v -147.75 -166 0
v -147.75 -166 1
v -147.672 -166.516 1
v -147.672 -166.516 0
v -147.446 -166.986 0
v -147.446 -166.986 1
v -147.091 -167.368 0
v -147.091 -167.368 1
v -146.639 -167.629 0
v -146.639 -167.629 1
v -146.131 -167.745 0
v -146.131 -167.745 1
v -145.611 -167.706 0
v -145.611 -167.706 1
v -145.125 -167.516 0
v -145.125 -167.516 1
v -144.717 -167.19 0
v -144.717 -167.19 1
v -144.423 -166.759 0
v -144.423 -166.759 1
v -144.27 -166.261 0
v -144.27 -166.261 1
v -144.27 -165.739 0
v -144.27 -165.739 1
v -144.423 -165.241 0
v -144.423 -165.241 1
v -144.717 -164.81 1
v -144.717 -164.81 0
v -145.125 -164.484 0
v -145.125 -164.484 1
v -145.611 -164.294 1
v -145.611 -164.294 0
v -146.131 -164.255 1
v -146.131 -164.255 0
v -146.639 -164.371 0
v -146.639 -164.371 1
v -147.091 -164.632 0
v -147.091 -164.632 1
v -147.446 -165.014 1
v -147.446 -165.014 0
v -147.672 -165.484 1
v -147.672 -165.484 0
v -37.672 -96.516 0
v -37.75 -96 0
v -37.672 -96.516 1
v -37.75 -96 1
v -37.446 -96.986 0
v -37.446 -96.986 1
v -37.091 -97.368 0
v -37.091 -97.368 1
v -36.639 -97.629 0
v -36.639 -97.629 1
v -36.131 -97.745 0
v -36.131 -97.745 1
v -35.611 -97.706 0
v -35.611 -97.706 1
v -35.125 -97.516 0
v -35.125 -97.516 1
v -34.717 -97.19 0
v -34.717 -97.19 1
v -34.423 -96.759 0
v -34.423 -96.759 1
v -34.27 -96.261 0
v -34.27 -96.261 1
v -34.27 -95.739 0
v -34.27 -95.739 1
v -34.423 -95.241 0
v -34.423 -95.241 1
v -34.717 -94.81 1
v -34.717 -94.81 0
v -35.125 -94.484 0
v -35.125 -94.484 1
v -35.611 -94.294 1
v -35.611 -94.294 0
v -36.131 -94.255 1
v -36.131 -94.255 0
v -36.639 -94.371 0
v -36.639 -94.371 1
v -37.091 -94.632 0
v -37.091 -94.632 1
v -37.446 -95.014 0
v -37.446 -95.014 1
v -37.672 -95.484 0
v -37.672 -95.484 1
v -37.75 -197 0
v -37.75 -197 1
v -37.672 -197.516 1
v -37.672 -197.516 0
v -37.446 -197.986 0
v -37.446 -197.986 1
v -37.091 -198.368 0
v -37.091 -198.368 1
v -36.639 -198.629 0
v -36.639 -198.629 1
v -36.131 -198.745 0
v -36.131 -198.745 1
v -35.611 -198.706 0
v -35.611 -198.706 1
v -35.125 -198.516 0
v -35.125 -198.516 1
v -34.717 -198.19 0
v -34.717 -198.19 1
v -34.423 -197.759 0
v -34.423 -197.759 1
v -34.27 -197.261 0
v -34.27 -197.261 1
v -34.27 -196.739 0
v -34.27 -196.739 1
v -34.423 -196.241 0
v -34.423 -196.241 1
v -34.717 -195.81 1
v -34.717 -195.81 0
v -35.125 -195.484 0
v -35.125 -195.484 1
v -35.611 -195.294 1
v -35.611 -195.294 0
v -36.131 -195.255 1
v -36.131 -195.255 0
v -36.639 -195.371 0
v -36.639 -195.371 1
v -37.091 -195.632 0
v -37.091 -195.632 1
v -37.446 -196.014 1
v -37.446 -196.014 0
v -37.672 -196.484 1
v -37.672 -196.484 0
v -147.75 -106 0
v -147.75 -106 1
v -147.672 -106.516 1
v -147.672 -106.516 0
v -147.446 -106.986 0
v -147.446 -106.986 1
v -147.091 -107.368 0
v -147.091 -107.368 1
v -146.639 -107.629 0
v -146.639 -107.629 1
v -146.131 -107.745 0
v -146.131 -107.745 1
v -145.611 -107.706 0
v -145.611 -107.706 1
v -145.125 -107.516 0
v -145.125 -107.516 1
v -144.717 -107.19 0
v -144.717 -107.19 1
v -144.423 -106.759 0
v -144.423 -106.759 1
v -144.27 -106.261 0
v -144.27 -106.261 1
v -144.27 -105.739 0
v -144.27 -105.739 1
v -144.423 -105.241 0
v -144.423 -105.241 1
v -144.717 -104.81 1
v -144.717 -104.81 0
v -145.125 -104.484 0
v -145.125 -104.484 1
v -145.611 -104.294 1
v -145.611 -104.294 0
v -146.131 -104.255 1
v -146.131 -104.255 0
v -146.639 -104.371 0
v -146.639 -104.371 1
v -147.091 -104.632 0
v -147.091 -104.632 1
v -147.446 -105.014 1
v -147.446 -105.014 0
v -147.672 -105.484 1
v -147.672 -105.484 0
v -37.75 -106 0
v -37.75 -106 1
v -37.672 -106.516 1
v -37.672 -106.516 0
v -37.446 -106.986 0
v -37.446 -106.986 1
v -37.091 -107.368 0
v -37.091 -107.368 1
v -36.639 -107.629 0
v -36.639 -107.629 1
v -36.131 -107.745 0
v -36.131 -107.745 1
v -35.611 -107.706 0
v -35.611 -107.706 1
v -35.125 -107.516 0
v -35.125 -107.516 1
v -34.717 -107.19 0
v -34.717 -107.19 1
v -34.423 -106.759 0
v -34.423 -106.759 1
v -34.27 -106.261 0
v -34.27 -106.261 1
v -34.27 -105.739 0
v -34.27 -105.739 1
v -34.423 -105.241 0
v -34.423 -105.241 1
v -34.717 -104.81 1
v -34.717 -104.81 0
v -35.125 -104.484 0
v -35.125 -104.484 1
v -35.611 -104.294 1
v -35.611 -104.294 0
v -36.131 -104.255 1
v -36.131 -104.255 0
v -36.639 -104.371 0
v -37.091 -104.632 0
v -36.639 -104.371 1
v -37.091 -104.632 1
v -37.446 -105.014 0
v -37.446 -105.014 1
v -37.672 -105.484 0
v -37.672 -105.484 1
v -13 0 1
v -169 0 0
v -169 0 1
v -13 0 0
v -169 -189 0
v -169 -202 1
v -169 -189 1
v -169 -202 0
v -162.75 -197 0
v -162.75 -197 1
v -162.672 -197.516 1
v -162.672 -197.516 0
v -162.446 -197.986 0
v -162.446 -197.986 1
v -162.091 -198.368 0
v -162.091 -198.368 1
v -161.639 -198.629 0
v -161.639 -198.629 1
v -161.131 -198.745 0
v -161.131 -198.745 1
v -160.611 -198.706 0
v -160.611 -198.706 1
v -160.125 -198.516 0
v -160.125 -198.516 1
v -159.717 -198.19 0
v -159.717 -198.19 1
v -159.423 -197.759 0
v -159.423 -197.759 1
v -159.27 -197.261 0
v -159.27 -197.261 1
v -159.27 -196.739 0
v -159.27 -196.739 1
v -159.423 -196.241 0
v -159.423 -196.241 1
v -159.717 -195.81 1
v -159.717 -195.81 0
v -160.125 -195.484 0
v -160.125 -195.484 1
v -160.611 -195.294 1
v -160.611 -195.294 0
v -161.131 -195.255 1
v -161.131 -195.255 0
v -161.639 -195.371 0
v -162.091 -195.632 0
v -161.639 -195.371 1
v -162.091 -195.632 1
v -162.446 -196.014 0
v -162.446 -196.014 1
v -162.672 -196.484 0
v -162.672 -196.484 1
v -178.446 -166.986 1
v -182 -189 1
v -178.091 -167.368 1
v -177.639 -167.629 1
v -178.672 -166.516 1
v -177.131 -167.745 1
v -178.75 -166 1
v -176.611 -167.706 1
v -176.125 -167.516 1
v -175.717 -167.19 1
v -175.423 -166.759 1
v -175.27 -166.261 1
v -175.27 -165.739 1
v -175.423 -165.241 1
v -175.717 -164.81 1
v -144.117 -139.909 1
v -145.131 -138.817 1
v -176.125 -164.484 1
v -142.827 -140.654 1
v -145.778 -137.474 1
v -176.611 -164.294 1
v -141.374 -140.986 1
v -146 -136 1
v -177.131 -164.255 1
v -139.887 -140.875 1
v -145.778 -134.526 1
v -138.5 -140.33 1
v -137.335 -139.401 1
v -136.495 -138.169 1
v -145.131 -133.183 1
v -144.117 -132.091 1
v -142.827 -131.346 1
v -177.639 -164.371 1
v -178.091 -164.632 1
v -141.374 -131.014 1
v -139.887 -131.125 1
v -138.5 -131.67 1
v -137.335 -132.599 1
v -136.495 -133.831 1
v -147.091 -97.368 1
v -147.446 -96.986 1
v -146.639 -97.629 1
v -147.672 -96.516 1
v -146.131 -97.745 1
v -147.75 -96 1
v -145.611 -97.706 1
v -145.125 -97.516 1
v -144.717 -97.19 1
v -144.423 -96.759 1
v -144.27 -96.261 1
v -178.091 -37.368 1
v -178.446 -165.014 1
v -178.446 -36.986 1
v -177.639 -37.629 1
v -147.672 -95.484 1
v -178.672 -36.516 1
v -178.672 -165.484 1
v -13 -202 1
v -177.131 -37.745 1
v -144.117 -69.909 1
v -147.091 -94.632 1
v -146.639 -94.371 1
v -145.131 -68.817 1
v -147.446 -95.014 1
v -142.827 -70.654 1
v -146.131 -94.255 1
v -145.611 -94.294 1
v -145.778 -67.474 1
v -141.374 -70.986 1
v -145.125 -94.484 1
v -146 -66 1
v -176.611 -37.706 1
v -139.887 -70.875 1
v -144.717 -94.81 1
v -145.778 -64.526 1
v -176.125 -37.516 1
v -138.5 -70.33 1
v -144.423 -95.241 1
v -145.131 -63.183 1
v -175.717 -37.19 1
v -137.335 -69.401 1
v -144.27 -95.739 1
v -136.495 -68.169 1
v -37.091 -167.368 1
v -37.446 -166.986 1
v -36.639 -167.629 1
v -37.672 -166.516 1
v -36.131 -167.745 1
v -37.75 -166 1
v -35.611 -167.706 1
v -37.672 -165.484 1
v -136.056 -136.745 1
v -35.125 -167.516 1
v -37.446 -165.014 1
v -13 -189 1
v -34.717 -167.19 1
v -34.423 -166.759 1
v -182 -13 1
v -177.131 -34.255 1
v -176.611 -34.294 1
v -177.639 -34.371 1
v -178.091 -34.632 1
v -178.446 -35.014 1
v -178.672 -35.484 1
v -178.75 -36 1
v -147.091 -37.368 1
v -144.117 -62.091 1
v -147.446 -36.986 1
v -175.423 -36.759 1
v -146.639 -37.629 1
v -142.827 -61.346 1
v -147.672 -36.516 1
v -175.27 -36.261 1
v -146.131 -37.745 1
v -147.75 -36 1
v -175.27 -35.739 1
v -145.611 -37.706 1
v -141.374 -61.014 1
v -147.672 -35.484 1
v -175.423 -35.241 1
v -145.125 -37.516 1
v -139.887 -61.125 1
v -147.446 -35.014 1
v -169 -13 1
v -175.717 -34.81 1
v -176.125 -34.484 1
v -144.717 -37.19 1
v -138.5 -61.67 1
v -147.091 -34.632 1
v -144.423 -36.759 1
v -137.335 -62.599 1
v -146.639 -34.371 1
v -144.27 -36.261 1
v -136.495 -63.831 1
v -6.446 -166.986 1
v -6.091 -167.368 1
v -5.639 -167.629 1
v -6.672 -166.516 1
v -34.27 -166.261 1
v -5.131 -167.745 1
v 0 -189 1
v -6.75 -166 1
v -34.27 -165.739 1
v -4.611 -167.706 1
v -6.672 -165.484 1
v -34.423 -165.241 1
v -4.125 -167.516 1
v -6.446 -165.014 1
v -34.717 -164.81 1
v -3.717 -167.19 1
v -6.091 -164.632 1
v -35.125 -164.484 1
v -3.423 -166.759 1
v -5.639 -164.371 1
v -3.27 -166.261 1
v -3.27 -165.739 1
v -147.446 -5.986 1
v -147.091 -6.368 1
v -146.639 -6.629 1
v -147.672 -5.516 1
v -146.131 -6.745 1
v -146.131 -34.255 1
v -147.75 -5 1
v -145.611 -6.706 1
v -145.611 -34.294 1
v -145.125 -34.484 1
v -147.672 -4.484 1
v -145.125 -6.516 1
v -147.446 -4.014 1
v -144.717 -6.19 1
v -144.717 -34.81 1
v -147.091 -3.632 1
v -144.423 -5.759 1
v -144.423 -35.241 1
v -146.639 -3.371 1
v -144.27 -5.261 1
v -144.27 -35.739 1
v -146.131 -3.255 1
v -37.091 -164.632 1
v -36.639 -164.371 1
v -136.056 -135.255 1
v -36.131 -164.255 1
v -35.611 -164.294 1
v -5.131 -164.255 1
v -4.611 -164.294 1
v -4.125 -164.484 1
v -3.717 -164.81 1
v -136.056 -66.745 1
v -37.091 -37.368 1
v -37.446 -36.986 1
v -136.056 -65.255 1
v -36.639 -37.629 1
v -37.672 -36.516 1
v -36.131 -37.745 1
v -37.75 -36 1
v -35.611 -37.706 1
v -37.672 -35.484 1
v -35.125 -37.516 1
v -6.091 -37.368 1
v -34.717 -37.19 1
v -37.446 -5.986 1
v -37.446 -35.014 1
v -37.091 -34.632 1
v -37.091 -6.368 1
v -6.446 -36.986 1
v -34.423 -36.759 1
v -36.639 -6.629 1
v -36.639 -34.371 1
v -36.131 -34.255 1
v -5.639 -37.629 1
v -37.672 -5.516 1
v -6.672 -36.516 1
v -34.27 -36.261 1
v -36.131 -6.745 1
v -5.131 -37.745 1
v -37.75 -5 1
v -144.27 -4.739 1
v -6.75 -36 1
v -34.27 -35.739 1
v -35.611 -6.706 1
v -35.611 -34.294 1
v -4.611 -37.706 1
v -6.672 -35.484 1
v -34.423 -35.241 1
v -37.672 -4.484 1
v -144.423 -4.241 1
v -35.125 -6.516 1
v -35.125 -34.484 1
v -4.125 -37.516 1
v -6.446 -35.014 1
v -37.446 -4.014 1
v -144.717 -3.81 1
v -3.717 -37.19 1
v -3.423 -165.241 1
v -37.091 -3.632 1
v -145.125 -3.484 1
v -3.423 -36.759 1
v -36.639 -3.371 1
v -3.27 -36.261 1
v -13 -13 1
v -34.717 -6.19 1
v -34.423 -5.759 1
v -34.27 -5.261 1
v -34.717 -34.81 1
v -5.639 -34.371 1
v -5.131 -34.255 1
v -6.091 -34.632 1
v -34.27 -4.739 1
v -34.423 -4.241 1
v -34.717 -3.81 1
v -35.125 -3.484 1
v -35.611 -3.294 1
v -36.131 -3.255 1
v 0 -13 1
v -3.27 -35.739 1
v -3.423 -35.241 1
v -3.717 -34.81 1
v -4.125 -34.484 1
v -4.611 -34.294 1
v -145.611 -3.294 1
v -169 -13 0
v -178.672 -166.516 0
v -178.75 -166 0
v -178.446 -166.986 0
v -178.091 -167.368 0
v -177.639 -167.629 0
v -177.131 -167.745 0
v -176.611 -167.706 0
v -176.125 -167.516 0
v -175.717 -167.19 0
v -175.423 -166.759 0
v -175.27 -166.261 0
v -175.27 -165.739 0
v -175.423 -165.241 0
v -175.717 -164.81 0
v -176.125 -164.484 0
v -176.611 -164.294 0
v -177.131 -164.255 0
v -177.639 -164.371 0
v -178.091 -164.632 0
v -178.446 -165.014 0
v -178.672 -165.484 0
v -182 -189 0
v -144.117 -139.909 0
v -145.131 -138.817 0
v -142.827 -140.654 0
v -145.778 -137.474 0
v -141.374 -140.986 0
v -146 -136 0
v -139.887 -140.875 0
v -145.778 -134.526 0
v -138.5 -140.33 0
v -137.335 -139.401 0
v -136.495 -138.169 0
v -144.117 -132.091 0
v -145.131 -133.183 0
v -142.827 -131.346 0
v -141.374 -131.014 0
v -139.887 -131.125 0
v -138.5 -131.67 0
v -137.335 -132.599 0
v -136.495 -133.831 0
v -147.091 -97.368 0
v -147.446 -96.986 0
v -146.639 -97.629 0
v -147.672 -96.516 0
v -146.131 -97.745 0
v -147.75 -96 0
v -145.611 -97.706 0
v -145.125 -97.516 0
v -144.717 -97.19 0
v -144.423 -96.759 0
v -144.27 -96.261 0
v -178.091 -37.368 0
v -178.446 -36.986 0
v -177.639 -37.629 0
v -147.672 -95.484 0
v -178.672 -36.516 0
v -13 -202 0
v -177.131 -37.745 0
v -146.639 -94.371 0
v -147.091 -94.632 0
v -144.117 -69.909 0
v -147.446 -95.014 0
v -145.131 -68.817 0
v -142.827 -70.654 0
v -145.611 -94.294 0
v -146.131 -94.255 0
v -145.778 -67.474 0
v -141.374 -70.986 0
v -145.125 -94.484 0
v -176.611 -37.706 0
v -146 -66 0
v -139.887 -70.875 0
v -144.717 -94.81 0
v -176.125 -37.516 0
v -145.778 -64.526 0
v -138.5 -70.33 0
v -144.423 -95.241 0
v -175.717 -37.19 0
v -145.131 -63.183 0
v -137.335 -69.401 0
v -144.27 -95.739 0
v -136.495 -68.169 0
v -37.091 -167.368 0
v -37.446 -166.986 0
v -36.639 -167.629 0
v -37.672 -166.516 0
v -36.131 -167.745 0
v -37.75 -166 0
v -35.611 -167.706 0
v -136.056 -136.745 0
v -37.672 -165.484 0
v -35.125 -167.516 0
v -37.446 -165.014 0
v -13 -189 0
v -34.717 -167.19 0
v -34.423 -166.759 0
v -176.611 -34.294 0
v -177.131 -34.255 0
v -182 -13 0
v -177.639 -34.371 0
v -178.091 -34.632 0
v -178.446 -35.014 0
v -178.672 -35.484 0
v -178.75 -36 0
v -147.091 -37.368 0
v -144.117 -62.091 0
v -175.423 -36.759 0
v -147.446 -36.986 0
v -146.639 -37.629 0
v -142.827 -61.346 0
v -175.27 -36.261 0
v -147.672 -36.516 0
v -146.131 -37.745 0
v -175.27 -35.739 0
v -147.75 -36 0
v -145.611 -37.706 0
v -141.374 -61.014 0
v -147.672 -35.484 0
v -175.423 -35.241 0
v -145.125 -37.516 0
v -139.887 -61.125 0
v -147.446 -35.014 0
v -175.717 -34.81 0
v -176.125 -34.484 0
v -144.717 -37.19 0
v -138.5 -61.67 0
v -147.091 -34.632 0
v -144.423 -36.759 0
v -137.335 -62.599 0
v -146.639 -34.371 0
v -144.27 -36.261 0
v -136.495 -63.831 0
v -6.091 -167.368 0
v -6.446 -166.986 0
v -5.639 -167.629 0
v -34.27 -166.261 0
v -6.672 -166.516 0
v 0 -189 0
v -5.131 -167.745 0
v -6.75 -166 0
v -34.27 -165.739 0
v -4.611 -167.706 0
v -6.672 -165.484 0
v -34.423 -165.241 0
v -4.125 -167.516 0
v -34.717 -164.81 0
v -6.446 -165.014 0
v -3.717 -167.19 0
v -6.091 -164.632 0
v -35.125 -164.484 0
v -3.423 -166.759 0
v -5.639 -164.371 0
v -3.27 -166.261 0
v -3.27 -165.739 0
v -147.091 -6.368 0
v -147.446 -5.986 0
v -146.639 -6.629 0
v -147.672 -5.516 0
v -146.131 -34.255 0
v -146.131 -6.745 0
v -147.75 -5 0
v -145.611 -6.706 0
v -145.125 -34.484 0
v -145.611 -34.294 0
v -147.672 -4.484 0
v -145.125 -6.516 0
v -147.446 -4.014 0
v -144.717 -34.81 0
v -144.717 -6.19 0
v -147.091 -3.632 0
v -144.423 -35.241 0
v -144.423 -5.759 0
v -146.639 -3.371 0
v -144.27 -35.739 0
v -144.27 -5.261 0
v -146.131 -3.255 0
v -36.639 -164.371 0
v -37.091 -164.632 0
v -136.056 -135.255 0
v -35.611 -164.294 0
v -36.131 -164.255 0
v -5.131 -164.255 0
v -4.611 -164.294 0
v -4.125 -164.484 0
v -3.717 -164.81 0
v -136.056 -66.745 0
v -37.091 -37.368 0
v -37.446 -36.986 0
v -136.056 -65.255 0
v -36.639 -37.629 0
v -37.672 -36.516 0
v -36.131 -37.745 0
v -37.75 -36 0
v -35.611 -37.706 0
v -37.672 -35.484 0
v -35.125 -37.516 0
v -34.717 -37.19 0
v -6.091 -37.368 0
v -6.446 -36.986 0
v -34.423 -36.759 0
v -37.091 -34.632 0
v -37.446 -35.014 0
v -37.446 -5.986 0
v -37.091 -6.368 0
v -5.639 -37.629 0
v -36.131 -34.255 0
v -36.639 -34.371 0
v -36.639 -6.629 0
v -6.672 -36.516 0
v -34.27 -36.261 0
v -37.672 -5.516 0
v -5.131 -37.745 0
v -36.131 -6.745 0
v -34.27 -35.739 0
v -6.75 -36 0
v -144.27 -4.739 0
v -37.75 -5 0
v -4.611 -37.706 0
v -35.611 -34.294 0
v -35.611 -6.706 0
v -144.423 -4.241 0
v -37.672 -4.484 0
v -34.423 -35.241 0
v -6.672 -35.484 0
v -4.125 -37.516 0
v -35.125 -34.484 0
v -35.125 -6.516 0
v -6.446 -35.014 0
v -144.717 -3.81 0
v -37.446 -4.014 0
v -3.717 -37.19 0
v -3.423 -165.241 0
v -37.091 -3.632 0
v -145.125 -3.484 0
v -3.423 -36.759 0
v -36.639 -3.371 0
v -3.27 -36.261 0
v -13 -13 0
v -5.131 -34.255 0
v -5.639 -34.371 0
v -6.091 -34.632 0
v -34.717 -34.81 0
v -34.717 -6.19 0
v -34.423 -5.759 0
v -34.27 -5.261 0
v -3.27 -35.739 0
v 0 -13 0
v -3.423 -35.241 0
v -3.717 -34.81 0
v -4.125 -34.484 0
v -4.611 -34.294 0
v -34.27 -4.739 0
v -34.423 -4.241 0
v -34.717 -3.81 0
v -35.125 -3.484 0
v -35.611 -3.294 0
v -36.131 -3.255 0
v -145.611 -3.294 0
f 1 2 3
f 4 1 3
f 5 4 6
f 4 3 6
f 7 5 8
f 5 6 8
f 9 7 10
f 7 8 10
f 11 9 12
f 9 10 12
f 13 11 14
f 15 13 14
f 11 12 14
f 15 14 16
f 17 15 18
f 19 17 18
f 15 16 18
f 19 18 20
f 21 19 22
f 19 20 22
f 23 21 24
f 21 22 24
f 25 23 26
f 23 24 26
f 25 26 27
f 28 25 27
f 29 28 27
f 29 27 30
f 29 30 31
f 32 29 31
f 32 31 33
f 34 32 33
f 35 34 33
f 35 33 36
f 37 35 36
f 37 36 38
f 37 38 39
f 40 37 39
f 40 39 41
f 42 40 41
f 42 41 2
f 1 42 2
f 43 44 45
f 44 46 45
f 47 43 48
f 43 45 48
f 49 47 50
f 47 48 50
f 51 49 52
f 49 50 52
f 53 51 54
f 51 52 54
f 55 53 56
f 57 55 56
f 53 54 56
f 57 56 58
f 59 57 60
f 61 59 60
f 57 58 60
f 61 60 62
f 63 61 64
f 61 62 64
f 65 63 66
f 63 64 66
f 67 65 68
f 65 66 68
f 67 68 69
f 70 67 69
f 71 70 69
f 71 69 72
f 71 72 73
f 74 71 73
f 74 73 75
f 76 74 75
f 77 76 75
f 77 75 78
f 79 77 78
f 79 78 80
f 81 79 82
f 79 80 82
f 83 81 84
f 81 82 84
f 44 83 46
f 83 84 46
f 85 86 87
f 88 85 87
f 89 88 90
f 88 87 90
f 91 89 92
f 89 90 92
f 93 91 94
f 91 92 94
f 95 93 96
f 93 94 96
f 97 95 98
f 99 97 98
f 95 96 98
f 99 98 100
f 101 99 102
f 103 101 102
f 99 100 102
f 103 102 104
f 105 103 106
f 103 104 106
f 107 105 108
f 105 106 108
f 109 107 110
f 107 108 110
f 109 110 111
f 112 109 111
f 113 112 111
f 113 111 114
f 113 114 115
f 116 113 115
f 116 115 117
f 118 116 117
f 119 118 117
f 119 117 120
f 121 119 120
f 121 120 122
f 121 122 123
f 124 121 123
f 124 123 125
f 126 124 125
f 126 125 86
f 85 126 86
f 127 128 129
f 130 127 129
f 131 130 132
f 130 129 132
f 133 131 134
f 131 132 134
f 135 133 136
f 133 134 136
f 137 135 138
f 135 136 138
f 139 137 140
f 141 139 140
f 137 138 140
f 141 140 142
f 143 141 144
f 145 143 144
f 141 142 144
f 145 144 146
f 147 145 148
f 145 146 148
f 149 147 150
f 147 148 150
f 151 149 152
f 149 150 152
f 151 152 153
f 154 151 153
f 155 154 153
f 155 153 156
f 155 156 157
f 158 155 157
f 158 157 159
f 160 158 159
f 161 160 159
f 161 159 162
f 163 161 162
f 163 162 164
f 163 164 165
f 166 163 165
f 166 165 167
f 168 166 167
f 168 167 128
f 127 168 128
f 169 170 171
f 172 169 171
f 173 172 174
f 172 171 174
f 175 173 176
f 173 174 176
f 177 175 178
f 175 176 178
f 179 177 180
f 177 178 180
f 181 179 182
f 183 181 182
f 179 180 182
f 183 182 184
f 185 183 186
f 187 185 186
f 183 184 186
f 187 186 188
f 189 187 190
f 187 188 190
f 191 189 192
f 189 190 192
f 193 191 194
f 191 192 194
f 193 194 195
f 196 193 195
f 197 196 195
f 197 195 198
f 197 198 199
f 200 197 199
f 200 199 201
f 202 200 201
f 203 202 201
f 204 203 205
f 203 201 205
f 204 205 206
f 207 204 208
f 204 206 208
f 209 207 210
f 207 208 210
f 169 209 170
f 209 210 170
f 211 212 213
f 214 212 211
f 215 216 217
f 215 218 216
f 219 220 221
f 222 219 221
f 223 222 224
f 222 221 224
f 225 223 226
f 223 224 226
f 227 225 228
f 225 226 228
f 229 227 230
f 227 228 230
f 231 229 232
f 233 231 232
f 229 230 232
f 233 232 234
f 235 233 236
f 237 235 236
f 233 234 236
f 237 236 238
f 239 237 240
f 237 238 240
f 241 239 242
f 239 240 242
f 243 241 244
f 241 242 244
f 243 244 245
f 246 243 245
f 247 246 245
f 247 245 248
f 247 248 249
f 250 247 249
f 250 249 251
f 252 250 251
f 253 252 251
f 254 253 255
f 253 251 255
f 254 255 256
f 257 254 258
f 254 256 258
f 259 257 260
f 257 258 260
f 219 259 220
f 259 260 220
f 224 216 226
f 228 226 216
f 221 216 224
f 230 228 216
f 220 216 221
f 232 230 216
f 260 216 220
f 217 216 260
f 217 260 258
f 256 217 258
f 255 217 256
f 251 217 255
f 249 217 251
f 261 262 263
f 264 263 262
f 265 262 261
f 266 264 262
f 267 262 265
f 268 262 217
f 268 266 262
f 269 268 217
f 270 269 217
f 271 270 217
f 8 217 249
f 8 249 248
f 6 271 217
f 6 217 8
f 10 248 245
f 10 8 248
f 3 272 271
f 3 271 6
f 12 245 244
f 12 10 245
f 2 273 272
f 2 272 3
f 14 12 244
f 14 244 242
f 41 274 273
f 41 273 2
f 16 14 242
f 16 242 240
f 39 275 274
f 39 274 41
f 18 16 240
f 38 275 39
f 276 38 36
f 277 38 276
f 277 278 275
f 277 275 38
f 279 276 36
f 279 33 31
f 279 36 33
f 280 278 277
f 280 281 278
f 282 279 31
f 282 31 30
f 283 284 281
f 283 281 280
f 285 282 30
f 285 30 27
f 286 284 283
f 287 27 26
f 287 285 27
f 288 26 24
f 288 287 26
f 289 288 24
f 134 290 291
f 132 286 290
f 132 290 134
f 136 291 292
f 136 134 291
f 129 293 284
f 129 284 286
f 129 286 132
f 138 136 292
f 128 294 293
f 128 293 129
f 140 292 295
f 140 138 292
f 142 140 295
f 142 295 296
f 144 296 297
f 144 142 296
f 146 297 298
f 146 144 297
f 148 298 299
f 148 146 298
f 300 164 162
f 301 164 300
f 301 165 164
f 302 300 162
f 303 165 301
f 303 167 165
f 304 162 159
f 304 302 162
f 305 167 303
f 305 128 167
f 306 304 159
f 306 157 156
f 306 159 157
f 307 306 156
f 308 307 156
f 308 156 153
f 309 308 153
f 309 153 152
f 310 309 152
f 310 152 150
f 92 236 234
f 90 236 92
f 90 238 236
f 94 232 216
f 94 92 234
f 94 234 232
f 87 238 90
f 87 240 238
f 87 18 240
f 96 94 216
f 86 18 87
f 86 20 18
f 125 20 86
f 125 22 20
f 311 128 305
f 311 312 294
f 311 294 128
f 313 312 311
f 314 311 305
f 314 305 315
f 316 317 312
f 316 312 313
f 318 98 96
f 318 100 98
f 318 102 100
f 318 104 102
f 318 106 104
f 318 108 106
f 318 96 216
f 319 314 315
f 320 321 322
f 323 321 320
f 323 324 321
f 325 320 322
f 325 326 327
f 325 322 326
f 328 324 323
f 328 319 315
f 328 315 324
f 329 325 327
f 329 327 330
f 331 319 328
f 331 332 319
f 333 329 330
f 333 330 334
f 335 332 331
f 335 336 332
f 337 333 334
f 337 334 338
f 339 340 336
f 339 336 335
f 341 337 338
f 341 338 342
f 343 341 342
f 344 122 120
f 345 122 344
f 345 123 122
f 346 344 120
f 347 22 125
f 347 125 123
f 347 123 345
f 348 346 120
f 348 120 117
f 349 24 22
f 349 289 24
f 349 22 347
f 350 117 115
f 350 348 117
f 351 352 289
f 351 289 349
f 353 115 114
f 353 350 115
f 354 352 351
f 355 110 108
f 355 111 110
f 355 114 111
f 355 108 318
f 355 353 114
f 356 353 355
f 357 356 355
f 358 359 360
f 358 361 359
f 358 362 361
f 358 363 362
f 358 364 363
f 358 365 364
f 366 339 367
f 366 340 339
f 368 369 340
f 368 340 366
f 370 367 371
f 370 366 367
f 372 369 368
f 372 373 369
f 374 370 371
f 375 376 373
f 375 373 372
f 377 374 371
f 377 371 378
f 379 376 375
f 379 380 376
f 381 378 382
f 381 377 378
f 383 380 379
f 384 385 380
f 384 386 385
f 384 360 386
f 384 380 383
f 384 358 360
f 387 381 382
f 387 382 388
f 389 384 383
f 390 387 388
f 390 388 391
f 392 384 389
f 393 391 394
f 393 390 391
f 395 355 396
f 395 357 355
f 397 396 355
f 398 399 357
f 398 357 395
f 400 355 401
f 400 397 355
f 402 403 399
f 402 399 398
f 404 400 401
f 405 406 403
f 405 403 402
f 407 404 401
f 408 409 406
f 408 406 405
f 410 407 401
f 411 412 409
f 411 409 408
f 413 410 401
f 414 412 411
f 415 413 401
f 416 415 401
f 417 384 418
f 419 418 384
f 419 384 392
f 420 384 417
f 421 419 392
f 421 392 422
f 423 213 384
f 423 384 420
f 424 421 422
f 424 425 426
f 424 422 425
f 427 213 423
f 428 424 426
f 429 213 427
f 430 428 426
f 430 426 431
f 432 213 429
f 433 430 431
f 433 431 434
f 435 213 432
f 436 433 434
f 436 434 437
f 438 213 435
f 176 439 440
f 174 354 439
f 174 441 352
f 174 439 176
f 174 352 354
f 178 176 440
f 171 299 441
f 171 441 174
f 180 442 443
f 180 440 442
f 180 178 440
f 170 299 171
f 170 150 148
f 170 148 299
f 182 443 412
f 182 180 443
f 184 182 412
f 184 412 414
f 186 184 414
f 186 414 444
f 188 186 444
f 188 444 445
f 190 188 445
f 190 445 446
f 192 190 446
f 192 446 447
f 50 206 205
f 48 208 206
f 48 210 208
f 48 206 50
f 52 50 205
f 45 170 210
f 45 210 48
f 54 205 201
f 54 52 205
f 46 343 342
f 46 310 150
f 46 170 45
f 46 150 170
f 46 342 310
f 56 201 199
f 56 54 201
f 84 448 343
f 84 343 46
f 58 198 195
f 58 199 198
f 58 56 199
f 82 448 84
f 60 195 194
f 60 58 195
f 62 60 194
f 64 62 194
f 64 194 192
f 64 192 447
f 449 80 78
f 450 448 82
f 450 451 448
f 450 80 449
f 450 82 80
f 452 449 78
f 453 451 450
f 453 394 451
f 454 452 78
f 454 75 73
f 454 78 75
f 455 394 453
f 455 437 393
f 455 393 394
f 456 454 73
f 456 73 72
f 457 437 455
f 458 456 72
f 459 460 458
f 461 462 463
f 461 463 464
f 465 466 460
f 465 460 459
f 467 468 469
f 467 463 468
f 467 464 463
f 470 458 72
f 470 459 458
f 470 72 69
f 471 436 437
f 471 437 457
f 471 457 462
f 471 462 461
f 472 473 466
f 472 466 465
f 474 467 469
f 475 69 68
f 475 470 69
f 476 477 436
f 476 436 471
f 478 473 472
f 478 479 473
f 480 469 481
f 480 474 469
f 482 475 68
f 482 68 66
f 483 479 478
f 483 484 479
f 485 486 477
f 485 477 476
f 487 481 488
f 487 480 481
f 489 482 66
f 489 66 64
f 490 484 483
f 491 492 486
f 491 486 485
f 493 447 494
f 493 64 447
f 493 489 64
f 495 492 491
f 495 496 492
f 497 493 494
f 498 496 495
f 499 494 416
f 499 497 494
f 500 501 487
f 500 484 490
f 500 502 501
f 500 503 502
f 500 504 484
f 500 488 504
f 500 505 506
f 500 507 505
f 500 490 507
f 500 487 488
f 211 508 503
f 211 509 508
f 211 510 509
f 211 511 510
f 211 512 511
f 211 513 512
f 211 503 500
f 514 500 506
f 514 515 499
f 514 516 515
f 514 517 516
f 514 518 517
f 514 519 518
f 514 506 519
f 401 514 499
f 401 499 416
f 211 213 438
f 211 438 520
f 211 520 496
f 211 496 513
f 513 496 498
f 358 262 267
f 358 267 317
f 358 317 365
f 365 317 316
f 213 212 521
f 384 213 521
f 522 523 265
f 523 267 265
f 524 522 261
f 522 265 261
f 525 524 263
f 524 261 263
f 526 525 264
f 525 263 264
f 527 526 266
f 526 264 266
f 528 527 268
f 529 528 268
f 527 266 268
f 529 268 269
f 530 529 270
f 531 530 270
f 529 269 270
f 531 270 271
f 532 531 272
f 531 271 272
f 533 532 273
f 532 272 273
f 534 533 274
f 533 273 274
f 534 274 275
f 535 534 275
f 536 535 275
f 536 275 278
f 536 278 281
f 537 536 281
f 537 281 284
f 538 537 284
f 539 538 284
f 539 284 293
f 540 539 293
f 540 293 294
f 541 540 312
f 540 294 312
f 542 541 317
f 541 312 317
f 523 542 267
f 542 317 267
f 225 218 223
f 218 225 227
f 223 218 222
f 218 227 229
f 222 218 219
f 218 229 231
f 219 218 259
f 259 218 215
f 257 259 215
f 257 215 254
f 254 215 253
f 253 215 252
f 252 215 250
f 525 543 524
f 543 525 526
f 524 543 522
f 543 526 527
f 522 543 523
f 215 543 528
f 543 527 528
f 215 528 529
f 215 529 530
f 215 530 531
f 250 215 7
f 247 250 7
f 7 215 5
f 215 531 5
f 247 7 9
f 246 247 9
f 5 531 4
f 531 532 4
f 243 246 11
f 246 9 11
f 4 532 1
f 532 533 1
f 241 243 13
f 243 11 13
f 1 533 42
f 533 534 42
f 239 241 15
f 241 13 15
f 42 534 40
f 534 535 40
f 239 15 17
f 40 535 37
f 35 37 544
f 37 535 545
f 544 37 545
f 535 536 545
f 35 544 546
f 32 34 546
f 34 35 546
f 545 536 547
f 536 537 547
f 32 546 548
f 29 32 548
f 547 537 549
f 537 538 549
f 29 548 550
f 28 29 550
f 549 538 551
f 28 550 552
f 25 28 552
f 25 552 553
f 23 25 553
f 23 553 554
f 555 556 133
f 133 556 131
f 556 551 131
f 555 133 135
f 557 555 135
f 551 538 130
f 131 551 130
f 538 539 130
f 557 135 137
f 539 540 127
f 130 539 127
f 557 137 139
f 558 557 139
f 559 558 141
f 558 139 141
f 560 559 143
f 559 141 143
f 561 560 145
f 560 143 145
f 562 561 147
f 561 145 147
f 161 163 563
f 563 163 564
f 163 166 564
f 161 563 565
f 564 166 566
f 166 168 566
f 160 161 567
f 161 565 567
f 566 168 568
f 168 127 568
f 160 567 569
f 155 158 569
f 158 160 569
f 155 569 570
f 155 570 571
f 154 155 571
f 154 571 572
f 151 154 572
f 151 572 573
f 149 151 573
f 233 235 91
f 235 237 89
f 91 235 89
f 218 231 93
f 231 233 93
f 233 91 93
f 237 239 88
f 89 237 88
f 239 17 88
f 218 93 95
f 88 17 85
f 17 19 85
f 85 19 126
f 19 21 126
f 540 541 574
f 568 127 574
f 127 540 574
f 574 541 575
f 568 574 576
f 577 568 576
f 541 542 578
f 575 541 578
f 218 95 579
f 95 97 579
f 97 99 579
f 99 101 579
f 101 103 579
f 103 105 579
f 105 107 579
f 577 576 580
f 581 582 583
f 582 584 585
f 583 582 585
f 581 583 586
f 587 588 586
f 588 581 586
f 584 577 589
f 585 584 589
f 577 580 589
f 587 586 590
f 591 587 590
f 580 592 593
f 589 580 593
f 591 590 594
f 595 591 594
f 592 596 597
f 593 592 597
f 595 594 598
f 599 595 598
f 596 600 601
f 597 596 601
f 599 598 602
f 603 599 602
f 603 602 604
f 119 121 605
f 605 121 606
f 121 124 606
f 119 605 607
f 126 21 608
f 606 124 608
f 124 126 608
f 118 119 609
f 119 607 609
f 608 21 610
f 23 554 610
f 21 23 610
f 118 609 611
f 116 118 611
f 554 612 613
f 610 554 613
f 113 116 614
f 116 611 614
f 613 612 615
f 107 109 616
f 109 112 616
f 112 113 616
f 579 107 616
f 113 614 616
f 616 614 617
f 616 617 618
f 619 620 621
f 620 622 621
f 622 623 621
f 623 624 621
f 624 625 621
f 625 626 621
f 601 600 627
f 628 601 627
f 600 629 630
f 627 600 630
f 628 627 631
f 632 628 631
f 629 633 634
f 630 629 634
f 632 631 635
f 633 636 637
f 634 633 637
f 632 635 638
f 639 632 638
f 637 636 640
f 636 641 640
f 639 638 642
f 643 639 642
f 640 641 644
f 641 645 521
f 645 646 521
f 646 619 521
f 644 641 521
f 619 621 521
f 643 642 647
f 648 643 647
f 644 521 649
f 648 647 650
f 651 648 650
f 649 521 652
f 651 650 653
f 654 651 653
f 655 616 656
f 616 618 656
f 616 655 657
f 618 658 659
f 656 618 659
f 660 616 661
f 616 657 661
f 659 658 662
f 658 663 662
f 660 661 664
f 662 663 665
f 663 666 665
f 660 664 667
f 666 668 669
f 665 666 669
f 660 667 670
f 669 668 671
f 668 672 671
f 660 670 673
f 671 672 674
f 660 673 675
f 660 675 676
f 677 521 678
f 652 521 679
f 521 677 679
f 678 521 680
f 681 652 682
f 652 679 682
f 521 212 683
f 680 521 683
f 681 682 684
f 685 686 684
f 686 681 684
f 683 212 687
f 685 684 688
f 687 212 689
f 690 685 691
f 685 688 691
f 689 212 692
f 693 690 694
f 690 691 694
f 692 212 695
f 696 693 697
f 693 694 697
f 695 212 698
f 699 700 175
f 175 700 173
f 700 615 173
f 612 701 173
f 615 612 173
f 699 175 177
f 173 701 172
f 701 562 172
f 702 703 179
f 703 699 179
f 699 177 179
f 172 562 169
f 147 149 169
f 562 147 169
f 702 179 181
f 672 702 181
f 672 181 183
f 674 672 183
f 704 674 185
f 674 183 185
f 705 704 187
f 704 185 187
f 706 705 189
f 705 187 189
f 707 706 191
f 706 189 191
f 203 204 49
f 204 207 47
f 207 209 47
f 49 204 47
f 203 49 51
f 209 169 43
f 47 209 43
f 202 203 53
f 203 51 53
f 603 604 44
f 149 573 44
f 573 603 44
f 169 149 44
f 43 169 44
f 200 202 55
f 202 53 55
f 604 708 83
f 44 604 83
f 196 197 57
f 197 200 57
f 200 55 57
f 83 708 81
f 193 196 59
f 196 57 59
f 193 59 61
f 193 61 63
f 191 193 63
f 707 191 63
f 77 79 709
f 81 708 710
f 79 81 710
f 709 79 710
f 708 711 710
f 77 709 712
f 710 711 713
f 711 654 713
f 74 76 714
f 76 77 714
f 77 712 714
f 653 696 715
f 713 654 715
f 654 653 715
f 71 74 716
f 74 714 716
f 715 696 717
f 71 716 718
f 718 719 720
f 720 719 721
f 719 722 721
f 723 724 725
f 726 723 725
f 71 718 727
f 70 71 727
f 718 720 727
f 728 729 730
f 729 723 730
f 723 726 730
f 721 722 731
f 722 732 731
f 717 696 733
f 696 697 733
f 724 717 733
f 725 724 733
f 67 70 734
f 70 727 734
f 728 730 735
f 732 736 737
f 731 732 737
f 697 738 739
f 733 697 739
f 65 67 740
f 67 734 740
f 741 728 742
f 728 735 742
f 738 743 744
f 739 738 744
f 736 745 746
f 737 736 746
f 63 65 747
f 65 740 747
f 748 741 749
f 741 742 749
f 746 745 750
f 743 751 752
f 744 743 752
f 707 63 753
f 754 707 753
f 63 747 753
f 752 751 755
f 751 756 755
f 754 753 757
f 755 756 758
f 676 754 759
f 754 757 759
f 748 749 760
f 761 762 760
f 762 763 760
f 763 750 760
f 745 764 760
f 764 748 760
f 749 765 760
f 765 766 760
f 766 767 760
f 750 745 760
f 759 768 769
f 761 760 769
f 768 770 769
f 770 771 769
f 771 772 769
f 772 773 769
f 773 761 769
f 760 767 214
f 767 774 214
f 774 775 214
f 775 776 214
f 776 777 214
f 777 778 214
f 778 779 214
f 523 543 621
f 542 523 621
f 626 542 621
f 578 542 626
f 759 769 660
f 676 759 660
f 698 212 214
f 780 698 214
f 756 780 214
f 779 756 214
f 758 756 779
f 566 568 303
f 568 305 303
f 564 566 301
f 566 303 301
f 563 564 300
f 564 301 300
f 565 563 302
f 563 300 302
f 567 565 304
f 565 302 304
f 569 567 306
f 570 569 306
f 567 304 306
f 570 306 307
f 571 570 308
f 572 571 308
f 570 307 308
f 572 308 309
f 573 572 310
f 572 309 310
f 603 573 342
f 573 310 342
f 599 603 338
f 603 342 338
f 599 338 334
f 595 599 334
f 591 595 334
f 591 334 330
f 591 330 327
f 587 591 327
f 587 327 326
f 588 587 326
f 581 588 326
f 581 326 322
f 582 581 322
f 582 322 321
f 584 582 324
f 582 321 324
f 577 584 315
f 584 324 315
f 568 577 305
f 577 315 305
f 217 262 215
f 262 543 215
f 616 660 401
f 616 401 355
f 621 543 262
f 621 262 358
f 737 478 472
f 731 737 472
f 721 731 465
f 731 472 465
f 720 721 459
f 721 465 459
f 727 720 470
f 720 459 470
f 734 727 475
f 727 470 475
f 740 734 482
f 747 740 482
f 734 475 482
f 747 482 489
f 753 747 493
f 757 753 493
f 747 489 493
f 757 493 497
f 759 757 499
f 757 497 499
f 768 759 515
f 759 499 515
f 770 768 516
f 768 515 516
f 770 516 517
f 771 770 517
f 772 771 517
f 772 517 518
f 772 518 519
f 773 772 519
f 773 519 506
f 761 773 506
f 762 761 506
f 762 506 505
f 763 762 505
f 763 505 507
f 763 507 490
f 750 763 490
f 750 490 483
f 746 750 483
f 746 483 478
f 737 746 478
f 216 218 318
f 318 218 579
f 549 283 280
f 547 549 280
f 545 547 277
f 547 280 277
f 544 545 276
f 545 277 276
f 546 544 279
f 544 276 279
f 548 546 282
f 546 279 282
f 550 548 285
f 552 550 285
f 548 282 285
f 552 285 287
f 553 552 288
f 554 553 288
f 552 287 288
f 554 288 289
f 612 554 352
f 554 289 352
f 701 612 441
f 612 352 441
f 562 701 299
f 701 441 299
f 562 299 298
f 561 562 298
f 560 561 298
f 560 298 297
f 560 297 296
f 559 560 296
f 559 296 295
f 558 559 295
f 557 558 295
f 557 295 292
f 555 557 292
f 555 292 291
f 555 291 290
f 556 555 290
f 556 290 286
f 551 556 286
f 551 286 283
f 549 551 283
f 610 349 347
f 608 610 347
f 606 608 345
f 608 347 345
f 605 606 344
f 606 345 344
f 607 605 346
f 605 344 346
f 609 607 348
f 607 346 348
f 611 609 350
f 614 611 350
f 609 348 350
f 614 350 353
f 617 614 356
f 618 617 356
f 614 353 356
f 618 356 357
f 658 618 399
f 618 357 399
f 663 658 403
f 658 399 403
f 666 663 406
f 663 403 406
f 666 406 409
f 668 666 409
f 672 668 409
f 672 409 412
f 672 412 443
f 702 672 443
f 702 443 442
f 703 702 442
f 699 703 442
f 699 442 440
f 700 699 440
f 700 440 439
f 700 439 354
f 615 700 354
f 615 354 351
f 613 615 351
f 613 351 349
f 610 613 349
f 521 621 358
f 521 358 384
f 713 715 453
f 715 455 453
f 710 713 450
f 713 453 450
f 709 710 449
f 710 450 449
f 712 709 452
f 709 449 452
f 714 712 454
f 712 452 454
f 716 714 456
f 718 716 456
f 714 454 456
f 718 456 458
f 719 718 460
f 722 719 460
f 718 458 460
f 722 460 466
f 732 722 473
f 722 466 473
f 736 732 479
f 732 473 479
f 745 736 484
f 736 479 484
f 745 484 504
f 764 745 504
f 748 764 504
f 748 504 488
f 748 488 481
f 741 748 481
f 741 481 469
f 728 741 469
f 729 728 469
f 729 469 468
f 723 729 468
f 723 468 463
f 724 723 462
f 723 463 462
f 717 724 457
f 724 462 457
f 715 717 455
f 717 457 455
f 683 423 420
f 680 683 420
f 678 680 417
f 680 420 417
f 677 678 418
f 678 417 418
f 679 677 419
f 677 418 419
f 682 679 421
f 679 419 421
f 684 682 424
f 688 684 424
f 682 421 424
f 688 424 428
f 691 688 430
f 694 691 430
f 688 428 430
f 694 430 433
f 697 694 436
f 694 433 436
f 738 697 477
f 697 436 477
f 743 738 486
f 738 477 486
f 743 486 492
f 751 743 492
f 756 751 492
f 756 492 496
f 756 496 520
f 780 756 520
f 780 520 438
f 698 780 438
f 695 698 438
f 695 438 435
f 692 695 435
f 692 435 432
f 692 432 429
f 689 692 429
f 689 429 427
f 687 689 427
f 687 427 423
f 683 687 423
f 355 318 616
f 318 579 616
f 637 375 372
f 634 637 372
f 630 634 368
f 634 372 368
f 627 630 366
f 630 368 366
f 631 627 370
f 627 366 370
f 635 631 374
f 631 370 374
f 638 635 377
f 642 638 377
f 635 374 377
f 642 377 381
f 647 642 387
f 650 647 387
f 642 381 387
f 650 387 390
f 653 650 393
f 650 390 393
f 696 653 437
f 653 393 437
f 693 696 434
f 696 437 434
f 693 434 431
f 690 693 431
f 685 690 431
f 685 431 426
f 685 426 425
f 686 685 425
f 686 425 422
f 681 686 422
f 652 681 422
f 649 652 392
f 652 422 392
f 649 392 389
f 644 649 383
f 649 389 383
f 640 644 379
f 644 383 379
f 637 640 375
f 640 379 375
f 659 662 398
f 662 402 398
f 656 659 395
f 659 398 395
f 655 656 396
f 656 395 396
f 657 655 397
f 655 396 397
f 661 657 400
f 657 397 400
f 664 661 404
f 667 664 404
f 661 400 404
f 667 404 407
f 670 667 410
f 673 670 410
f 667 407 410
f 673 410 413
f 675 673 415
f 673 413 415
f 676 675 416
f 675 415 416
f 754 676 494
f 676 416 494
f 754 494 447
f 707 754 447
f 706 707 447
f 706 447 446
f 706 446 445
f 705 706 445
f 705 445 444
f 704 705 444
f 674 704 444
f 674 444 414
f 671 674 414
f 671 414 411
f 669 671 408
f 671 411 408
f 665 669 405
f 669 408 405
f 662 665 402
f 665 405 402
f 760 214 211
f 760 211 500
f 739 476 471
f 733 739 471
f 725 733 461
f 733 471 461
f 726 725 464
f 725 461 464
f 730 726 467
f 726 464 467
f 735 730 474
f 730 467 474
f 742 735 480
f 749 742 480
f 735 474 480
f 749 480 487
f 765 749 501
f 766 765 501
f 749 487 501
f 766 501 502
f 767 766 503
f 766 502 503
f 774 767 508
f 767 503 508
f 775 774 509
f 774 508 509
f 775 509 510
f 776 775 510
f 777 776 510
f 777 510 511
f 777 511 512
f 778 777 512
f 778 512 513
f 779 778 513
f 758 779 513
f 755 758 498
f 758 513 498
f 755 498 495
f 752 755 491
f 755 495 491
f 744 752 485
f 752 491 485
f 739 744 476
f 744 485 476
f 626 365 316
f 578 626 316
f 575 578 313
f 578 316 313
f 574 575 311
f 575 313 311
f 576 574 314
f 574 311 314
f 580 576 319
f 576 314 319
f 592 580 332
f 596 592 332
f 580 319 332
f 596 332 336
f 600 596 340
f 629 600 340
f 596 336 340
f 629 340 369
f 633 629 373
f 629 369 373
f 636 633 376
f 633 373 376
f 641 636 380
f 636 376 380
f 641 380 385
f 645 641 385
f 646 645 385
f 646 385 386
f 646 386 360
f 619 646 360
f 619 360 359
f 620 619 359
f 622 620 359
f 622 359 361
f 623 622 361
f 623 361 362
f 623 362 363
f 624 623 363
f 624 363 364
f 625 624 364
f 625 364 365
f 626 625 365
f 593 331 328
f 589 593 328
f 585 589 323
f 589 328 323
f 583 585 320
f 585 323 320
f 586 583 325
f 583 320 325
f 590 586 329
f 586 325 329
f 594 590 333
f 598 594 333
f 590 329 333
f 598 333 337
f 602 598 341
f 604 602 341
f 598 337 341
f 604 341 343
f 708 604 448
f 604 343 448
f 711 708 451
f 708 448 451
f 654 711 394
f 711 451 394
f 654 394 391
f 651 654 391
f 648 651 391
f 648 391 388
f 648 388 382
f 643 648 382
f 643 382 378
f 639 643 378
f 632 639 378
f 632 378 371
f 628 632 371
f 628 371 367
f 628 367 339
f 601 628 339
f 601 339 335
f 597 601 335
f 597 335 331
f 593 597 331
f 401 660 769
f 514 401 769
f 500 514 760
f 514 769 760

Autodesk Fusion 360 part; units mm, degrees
sketch "Sketch1" plane through (0, 0, 0) normal (0, 0, 1) x (1, 0, 0) in component "Hot Plate Mounting Plate"
  line L0 (0, 0) -> (-182, 0) construction
  line L1 (-182, 0) -> (-182, -202) construction
  line L2 (-182, -202) -> (0, -202) construction
  line L3 (0, -202) -> (0, 0) construction
  line L4 (-91, -202) -> (-91, 0) construction
  line L5 (0, -101) -> (-182, -101) construction
  line L6 (-91, 0) -> (-13, 0)
  line L7 (-91, 0) -> (-169, 0)
  line L8 (-91, -202) -> (-13, -202)
  line L9 (-91, -202) -> (-169, -202)
  line L10 (0, -101) -> (0, -13)
  line L11 (0, -101) -> (0, -189)
  line L12 (-182, -101) -> (-182, -189)
  line L13 (-182, -101) -> (-182, -13)
  line L14 (-182, -13) -> (0, -13) construction
  line L15 (0, -189) -> (-182, -189) construction
  line L16 (-13, -202) -> (-13, 0) construction
  line L17 (-169, 0) -> (-169, -202) construction
  line L18 (0, -189) -> (-13, -189)
  line L19 (-13, -202) -> (-13, -189)
  line L20 (-169, -202) -> (-169, -189)
  line L21 (-182, -189) -> (-169, -189)
  line L22 (0, -13) -> (-13, -13)
  line L23 (-13, 0) -> (-13, -13)
  line L24 (-169, 0) -> (-169, -13)
  line L25 (-182, -13) -> (-169, -13)
  dimension "d1" = 182
  dimension "d2" = 202
  dimension "d3" = 78
  dimension "d4" = 78
  dimension "d5" = 78
  dimension "d6" = 78
  dimension "d7" = 88
  dimension "d8" = 88
  dimension "d9" = 88
  dimension "d10" = 88
extrude "Extrude1" add sketch "Sketch1" along normal blind 1 in component "Hot Plate Mounting Plate"
sketch "Sketch3" plane through (0, 0, 1) normal (0, 0, 1) x (-1, 0, 0) in component "Hot Plate Mounting Plate"
  line L0 (182, 13) -> (182, 189)
  line L1 (182, 189) -> (169, 189)
  line L2 (169, 189) -> (169, 202)
  line L3 (169, 202) -> (13, 202)
  line L4 (13, 202) -> (13, 189)
  line L5 (13, 189) -> (0, 189)
  line L6 (0, 189) -> (0, 13)
  line L7 (0, 13) -> (13, 13)
  line L8 (13, 13) -> (13, 0)
  line L9 (13, 0) -> (169, 0)
  line L10 (169, 0) -> (169, 13)
  line L11 (169, 13) -> (182, 13)
  line L12 (177, 13) -> (177, 189) construction
  line L13 (169, 5) -> (13, 5) construction
  line L14 (5, 13) -> (5, 189) construction
  line L15 (13, 197) -> (169, 197) construction
  line L16 (182, 36) -> (0, 36) construction
  line L17 (182, 166) -> (0, 166) construction
  line L18 (146, 0) -> (146, 202) construction
  line L19 (36, 0) -> (36, 202) construction
  circle A0 centre (146, 5) radius 1.75
  circle A1 centre (177, 36) radius 1.75
  circle A2 centre (177, 166) radius 1.75
  circle A3 centre (36, 197) radius 1.75
  circle A4 centre (5, 166) radius 1.75
  circle A5 centre (5, 36) radius 1.75
  circle A6 centre (36, 5) radius 1.75
  line L20 (161, 202) -> (161, 0) construction
  circle A7 centre (161, 197) radius 1.75
  dimension "d44" = 5
  dimension "d45" = 5
  dimension "d46" = 5
  dimension "d47" = 5
  dimension "d48" = 23
  dimension "d49" = 23
  dimension "d50" = 23
  dimension "d51" = 23
  dimension "d52" = 3.5
  dimension "d53" = 3.5
  dimension "d54" = 3.5
  dimension "d56" = 3.5
  dimension "d57" = 3.5
  dimension "d60" = 3.5
  dimension "d61" = 3.5
  dimension "d62" = 8
  dimension "d63" = 3.5
extrude "Extrude3" cut sketch "Sketch3" against normal up to surface (1 mm away) contours A0 | A1 | A2 | A3 | A4 | A5 | A6 | A7 in component "Hot Plate Mounting Plate"
sketch "Sketch4" plane through (0, 0, 1) normal (0, 0, 1) x (-1, 0, 0) in component "Hot Plate Mounting Plate"
  circle A0 centre (5, 36) radius 1.75
  circle A1 centre (5, 166) radius 1.75
  circle A2 centre (177, 166) radius 1.75
  circle A3 centre (36, 5) radius 1.75
  circle A4 centre (146, 5) radius 1.75
  circle A5 centre (36, 197) radius 1.75
  circle A6 centre (177, 36) radius 1.75
  circle A7 centre (161, 197) radius 1.75
  line L0 (182, 13) -> (182, 189)
  line L1 (182, 189) -> (169, 189)
  line L2 (169, 189) -> (169, 202)
  line L3 (169, 202) -> (13, 202)
  line L4 (13, 202) -> (13, 189)
  line L5 (13, 189) -> (0, 189)
  line L6 (0, 189) -> (0, 13)
  line L7 (0, 13) -> (13, 13)
  line L8 (13, 13) -> (13, 0)
  line L9 (13, 0) -> (169, 0)
  line L10 (169, 0) -> (169, 13)
  line L11 (169, 13) -> (182, 13)
  line L12 (182, 101) -> (0, 101) construction
  line L13 (91, 0) -> (91, 202) construction
  line L14 (31, 31) -> (151, 31) construction
  line L15 (151, 31) -> (151, 171) construction
  line L16 (151, 171) -> (31, 171) construction
  line L17 (31, 171) -> (31, 31) construction
  line L18 (31, 31) -> (151, 171) construction
  line L19 (151, 31) -> (31, 171) construction
  line L20 (146, 31) -> (146, 171) construction
  line L21 (151, 36) -> (31, 36) construction
  line L22 (36, 31) -> (36, 171) construction
  line L23 (151, 166) -> (31, 166) construction
  circle A8 centre (146, 36) radius 1.75
  line L24 (151, 96) -> (31, 96) construction
  line L25 (151, 106) -> (31, 106) construction
  circle A9 centre (146, 96) radius 1.75
  circle A10 centre (36, 96) radius 1.75
  circle A11 centre (146, 106) radius 1.75
  circle A12 centre (36, 106) radius 1.75
  circle A13 centre (146, 166) radius 1.75
  circle A14 centre (36, 166) radius 1.75
  circle A15 centre (36, 36) radius 1.75
  line L26 (151, 66) -> (31, 66) construction
  line L27 (151, 136) -> (31, 136) construction
  line L28 (141, 31) -> (141, 171) construction
  circle A16 centre (141, 66) radius 5
  circle A17 centre (141, 136) radius 5
  point P0 (91, 101)
  dimension "d64" = 120
  dimension "d65" = 140
  dimension "d66" = 5
  dimension "d67" = 5
  dimension "d68" = 5
  dimension "d69" = 5
  dimension "d70" = 3.5
  dimension "d71" = 5
  dimension "d72" = 5
  dimension "d73" = 3.5
  dimension "d74" = 3.5
  dimension "d75" = 3.5
  dimension "d76" = 3.5
  dimension "d77" = 3.5
  dimension "d78" = 3.5
  dimension "d79" = 3.5
  dimension "d83" = 35
  dimension "d84" = 35
  dimension "d85" = 10
  dimension "d86" = 10
  dimension "d87" = 10
extrude "Extrude4" cut sketch "Sketch4" against normal up to surface (1 mm away) contours A8 | A9 | A10 | A11 | A12 | A13 | A14 | A15 | A16 | A17 in component "Hot Plate Mounting Plate"
component "Hot Plate Mounting Plate" placed x (1, 0, 0) y (0, 1, 0) z (0, 0, 1) at (0, 0, 0)
